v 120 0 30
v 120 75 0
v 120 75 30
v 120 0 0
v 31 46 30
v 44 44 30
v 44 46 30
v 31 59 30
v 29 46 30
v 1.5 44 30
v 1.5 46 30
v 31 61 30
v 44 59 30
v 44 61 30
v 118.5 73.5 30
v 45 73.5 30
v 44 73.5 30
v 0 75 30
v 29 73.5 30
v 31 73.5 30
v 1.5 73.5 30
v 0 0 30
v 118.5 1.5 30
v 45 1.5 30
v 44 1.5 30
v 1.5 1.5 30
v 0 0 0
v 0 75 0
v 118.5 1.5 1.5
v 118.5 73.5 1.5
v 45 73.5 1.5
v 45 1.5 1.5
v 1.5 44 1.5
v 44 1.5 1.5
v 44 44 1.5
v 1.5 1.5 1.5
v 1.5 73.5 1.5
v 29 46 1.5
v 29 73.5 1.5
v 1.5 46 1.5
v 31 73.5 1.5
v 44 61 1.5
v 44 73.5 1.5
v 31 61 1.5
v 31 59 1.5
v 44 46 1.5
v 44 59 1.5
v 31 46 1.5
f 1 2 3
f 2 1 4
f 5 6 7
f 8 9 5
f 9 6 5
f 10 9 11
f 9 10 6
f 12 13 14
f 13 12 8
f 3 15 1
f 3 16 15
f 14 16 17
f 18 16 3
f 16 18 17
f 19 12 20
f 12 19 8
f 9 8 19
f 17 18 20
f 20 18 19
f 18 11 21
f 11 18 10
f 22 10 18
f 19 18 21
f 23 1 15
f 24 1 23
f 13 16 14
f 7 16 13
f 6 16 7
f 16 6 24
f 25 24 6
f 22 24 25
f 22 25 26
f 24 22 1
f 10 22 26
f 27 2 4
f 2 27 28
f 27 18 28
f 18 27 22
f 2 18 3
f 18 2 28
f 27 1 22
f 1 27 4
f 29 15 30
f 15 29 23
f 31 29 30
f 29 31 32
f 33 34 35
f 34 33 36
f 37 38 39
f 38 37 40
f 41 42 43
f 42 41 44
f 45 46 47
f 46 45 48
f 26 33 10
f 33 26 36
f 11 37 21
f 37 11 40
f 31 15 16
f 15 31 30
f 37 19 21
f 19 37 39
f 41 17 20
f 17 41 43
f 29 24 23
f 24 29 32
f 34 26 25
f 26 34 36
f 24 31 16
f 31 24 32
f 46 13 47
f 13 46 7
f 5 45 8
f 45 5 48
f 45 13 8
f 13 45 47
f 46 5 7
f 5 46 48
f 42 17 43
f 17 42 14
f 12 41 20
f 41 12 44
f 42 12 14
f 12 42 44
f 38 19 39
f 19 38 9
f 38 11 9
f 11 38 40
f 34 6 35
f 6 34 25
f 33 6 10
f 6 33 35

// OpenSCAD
// TODO:
// * adjust inner positions for wall thickness

$fn = 50;
cm = 10;

height = 3*cm;
unit = 1.5*cm;
outer_wall = 1.5;
inner_wall = 1;

box(8*unit, 5*unit, height, outer_wall);

// one
translate([2*unit,3*unit,0])
    box(1*unit, 1*unit, height, inner_wall);

// one'
translate([2*unit,4*unit,0])
    box(1*unit, 1*unit, height, inner_wall);

// two
translate([0*unit,3*unit,0])
    box(2*unit, 2*unit, height, inner_wall);

// three
translate([0*unit,0*unit,0])
    box(3*unit, 3*unit, height, inner_wall);

module box(w, l, h, wall) {
    difference() {
        cube([w, l, h]);
        translate([wall,wall,wall])
            cube([w-(wall*2), l-(wall*2), h+1]);
    }
}

module lid(w,l,wall) {
    cube([w,l,wall]);
    translate([wall,wall,wall])
        color("grey") cube([w-(wall*2), l-(wall*2), wall+1]);
}
